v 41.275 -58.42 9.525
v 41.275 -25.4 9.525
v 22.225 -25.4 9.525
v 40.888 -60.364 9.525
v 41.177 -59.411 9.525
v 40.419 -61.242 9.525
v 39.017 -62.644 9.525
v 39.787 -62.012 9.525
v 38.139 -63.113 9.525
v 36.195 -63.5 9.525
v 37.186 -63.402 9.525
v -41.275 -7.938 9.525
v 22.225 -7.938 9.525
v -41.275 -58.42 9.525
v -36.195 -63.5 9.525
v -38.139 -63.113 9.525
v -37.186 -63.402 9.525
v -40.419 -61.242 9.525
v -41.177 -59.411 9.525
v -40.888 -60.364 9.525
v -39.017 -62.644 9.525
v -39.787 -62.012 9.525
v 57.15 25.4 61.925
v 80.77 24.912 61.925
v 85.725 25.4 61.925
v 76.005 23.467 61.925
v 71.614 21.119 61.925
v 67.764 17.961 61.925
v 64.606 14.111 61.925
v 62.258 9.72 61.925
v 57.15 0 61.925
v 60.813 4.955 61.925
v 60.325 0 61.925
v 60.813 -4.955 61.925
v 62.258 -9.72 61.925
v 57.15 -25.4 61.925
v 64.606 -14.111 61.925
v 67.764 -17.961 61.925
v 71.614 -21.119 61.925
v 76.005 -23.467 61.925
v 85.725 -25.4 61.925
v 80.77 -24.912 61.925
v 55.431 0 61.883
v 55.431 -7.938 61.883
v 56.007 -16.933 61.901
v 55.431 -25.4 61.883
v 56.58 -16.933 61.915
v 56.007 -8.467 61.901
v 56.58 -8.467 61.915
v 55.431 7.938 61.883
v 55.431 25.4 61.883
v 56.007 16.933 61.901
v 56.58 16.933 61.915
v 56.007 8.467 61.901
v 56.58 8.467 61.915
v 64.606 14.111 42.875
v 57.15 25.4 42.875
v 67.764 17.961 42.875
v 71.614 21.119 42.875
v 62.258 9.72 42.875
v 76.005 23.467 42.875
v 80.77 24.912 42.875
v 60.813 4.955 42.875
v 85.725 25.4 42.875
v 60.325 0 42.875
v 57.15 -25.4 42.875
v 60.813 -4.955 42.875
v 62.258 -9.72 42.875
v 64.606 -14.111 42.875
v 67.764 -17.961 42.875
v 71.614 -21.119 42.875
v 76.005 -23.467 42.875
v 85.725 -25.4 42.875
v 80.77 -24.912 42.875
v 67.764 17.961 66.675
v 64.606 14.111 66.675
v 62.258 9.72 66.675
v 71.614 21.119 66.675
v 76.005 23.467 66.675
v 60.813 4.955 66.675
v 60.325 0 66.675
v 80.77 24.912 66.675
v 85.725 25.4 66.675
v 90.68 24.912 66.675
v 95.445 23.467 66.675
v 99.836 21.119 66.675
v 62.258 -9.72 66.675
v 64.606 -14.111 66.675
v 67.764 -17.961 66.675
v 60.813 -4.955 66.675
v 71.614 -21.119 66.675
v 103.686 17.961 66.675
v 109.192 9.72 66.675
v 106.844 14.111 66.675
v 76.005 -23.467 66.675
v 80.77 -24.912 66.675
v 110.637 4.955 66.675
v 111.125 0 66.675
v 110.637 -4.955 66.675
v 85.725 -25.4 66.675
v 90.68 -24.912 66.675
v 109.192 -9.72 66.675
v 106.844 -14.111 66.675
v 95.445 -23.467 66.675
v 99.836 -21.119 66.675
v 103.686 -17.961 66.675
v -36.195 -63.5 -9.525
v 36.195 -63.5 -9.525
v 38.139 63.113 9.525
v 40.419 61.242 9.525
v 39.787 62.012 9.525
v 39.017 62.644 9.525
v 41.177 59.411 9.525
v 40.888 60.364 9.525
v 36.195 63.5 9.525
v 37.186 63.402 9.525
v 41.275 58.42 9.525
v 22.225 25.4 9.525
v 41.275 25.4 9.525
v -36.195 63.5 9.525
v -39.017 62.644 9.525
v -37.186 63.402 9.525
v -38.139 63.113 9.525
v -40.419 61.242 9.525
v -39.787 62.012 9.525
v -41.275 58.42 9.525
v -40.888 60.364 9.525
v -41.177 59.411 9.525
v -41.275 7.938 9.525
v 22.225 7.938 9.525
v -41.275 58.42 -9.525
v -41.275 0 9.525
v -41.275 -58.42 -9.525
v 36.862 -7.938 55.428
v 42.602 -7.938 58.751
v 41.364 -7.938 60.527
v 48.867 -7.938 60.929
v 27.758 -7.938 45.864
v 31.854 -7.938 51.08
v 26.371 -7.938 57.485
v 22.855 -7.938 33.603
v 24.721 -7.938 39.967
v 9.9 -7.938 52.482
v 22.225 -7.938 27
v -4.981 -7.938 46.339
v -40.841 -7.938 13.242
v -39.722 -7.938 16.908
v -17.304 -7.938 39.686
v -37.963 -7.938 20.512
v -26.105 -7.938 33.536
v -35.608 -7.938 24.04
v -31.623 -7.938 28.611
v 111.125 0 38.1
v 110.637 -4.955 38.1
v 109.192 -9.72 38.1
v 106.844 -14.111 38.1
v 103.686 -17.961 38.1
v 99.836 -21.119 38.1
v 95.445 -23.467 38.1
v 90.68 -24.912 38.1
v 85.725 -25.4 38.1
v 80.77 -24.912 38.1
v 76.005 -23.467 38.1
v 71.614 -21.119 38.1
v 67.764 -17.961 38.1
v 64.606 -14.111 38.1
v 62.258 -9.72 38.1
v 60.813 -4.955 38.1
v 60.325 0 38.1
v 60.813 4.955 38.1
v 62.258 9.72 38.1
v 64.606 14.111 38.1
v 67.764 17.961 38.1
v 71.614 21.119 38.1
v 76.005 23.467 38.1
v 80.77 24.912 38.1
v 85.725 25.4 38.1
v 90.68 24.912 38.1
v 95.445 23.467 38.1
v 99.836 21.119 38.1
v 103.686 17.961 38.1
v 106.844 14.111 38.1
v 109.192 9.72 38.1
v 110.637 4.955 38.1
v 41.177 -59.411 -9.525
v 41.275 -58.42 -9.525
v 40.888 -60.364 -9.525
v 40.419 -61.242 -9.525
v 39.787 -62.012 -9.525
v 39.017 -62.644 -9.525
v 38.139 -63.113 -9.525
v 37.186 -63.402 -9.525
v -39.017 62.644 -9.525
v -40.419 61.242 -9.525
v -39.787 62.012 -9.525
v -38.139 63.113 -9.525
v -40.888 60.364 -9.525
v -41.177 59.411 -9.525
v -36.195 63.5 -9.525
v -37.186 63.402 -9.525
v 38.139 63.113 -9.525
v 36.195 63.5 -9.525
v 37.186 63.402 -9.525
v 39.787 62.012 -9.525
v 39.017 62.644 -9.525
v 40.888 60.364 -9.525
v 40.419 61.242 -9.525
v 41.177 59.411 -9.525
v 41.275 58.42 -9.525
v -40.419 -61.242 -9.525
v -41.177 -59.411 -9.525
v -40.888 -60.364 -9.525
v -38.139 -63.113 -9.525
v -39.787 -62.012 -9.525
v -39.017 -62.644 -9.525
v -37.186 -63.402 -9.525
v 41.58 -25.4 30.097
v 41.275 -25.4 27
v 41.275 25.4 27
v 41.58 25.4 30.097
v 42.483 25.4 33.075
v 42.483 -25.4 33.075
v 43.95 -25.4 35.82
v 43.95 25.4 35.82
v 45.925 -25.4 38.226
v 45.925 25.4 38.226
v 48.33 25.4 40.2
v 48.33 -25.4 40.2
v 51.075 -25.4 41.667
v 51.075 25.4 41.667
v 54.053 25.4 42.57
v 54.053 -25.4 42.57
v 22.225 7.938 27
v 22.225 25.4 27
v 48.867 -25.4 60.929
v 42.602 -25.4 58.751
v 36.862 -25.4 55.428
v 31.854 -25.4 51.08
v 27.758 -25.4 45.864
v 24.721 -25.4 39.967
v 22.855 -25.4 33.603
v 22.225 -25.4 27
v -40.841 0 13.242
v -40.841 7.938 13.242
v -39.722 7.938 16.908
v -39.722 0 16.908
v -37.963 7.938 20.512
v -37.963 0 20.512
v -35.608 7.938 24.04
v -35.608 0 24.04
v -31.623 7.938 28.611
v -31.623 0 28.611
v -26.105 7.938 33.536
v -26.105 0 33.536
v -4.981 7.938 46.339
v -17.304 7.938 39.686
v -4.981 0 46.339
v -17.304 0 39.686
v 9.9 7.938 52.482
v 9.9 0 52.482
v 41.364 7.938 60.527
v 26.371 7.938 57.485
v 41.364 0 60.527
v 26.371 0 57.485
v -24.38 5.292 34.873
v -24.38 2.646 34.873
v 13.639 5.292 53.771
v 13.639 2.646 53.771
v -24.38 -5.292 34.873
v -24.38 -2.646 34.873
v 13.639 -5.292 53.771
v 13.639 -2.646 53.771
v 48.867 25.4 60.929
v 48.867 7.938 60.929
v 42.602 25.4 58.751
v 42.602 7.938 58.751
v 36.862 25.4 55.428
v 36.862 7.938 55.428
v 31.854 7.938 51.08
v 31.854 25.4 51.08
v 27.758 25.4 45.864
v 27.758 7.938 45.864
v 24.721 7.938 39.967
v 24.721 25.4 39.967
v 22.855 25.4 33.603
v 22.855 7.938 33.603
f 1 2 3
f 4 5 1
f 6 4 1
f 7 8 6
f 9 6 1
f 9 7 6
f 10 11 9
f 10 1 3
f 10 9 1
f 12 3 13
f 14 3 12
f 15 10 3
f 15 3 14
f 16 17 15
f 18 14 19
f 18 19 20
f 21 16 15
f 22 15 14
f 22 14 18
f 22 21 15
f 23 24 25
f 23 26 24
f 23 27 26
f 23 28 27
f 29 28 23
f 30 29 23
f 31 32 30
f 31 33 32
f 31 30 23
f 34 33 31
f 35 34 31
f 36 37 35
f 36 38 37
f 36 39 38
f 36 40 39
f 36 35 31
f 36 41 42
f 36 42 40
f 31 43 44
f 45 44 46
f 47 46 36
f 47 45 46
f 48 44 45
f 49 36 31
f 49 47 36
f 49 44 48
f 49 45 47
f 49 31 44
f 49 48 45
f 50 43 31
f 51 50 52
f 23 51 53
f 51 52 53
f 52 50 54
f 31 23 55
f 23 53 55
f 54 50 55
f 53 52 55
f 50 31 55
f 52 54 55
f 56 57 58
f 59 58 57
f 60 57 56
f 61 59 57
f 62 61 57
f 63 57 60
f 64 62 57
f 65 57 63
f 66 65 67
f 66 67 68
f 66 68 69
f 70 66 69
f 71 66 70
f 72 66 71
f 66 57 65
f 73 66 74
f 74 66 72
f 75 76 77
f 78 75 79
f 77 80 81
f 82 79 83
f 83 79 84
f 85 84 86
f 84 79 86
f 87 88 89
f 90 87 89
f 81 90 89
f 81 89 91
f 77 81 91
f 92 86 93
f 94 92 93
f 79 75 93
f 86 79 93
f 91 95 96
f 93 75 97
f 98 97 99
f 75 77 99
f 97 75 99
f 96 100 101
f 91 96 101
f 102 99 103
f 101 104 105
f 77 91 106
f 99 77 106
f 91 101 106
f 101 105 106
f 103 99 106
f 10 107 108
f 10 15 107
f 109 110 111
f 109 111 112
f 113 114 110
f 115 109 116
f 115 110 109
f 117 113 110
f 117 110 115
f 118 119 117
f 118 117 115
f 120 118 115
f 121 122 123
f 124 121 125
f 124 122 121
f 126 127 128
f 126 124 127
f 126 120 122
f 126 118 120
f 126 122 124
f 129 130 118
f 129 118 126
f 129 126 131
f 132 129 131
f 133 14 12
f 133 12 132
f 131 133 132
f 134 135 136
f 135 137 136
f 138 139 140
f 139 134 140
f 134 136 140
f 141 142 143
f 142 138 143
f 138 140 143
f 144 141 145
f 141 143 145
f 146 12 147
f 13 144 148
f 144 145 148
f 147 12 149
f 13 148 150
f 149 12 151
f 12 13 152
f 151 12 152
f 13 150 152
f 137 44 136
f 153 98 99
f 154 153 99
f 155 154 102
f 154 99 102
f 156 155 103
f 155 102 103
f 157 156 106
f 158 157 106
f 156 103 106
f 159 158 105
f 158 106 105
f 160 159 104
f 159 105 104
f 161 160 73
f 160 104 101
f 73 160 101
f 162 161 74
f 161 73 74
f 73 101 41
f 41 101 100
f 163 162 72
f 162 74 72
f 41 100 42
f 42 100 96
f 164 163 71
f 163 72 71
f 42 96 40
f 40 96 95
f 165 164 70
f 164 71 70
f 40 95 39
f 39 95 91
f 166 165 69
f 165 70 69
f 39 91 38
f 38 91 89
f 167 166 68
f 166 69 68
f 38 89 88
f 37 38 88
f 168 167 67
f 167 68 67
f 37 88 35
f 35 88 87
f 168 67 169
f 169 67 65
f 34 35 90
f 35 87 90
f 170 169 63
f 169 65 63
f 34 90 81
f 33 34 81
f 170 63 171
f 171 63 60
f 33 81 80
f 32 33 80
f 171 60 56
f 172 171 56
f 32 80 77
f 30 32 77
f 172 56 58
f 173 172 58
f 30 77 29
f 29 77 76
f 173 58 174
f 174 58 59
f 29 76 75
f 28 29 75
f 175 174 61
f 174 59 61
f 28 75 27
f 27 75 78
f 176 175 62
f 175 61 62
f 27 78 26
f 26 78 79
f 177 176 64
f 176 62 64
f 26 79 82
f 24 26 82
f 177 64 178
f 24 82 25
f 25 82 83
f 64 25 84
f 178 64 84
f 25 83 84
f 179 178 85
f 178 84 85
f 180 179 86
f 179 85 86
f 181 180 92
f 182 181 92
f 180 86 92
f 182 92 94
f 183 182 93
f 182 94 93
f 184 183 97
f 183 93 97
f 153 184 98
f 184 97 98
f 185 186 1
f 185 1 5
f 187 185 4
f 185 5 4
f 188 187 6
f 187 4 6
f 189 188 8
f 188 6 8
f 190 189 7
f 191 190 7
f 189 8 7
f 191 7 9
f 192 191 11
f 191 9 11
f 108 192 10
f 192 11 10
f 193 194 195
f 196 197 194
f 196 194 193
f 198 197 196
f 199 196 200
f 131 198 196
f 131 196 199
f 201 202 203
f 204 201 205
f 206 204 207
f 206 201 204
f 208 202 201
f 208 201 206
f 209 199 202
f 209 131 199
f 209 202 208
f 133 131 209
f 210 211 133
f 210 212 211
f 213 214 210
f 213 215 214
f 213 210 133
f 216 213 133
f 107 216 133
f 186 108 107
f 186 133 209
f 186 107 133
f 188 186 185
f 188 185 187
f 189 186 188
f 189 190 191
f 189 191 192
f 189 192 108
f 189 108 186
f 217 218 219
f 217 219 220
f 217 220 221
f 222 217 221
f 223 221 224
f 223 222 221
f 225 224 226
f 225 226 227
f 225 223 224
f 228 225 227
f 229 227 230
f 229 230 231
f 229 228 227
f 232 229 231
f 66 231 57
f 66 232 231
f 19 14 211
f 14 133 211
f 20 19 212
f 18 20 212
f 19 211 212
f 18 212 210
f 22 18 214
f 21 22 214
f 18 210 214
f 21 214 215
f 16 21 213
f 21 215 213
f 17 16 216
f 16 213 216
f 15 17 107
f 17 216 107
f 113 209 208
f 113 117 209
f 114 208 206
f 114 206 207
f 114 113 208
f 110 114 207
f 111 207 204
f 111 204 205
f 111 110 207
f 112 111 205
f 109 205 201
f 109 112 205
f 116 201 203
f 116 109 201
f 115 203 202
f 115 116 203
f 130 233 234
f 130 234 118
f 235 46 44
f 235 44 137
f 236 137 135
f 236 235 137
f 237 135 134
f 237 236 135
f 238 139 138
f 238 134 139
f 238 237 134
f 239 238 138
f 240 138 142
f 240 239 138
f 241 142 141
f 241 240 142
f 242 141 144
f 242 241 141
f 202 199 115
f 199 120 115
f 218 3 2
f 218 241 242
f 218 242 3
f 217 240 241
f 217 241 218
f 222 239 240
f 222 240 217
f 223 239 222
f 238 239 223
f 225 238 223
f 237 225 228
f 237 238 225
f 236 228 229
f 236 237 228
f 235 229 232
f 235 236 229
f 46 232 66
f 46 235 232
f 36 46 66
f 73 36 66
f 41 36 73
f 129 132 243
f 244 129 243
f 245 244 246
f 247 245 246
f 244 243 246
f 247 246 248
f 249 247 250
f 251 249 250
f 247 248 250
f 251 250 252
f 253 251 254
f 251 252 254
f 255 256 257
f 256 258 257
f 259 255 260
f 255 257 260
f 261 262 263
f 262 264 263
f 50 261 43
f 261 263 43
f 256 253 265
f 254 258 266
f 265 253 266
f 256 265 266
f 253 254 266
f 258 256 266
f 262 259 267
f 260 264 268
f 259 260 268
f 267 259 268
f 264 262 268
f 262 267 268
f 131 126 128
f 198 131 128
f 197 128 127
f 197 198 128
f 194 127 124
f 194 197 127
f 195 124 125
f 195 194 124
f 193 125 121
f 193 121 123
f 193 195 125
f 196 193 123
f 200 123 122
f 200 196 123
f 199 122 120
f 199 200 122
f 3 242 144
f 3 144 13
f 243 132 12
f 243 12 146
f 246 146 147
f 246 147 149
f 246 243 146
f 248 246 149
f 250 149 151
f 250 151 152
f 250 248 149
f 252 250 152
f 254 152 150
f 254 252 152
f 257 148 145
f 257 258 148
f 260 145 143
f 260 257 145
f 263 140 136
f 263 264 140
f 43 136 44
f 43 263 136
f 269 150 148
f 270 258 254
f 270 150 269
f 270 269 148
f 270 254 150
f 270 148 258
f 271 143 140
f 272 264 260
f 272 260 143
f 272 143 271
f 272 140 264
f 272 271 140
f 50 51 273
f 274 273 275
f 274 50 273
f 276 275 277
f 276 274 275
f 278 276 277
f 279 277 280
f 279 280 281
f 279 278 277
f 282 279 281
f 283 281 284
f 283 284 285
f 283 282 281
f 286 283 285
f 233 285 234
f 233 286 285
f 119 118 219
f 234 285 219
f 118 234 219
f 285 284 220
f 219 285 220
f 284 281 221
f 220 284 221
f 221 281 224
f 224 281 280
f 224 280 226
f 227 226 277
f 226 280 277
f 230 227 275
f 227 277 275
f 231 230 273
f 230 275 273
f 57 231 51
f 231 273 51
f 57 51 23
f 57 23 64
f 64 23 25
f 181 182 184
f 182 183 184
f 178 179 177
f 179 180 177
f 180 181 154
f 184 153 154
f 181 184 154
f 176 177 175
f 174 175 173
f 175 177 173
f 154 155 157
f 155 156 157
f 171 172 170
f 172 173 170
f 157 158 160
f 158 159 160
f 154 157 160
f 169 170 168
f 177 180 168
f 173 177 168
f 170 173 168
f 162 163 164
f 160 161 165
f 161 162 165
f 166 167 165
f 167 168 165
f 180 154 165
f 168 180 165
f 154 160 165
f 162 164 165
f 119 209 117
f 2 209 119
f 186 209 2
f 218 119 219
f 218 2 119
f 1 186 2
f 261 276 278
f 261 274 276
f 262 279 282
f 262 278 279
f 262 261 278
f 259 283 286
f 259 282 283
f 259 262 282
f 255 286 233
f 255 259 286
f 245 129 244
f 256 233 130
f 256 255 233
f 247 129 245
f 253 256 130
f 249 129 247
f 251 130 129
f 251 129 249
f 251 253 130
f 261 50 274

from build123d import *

# Parameters (mm, degrees)
F1_DEPTH = 63.5
F0_W     = 25.4
F0_H     = 19.05
F2_DEPTH = 25.4
F3_DEPTH = 7.9375
F5_R     = 5.08


# Not quite as in the source:
# - ends of sketch curves that miss each other by under 0.0002 mm in the source are joined


with BuildPart() as f1:
    # F0 (on Front) → F1 (new body, symmetric)
    with BuildSketch(Plane.XZ):
        Polygon((-41.275, -9.525), (41.275, -9.525), (41.275, 9.525), (22.225, 9.525), (-41.275, 9.525), align=None)
    extrude(amount=F1_DEPTH, both=True)

    # F0 (on Front) → F2 (join, symmetric)
    with BuildSketch(Plane.XZ):
        with BuildLine():
            Line((22.225, 9.525), (41.275, 9.525))
            Line((41.275, 9.525), (41.275, 27.0002))
            ThreePointArc((41.275, 27.0002), (45.9246798487, 38.2255201513), (57.15, 42.8752))
            Line((57.15, 42.8752), (60.325, 42.8752))
            Line((60.325, 42.8752), (60.325, 61.9252))
            Line((60.325, 61.9252), (57.15, 61.9252))
            add(Edge.make_bspline(
                [(55.4308013552, 61.8828601769), (56.0086976587, 61.9022725241), (56.5818561966, 61.916408872), (57.15, 61.9252)],
                knots=[109.8295826069, 109.8295826069, 109.8295826069, 109.8295826069, 111.5045361635, 111.5045361635, 111.5045361635, 111.5045361635], degree=3))
            ThreePointArc((55.4308013552, 61.8828601769), (31.8537686832, 51.0804056919), (22.225, 27.0002))
            Line((22.225, 27.0002), (22.225, 9.525))
        make_face()
        with Locations((73.025, 52.4002)):
            Rectangle(F0_W, F0_H)
    extrude(amount=F2_DEPTH, both=True)

    # F0 (on Front) → F3 (join, symmetric)
    with BuildSketch(Plane.XZ):
        with BuildLine():
            add(Edge.make_bspline(
                [(-41.275, 9.525), (-40.7272405937, 36.6521064094), (17.5371477958, 60.609959217), (55.4308013552, 61.8828601769)],
                knots=[0, 0, 0, 0, 109.8295826069, 109.8295826069, 109.8295826069, 109.8295826069], degree=3))
            Line((-41.275, 9.525), (22.225, 9.525))
            Line((22.225, 9.525), (22.225, 27.0002))
            ThreePointArc((22.225, 27.0002), (31.8537686832, 51.0804056919), (55.4308013552, 61.8828601769))
        make_face()
    extrude(amount=F3_DEPTH, both=True)

    # F0 (on Front) → F4 (revolve)
    with BuildSketch(Plane.XZ):
        Polygon((85.725, 61.9252), (85.725, 42.8752), (85.725, 38.1), (111.125, 38.1), (111.125, 66.675), (85.725, 66.675), align=None)
    revolve(axis=Axis((85.725, 0, 52.3875), (0, 0, -1)))

    # F5
    f5_edges = [f1.edges().sort_by_distance(p)[0] for p in [
        (41.275, -63.5, 0),
        (-41.275, -63.5, 0),
        (-41.275, 63.5, 0),
        (41.275, 63.5, 0),
    ]]
    fillet(f5_edges, radius=F5_R)


solid = f1.part
